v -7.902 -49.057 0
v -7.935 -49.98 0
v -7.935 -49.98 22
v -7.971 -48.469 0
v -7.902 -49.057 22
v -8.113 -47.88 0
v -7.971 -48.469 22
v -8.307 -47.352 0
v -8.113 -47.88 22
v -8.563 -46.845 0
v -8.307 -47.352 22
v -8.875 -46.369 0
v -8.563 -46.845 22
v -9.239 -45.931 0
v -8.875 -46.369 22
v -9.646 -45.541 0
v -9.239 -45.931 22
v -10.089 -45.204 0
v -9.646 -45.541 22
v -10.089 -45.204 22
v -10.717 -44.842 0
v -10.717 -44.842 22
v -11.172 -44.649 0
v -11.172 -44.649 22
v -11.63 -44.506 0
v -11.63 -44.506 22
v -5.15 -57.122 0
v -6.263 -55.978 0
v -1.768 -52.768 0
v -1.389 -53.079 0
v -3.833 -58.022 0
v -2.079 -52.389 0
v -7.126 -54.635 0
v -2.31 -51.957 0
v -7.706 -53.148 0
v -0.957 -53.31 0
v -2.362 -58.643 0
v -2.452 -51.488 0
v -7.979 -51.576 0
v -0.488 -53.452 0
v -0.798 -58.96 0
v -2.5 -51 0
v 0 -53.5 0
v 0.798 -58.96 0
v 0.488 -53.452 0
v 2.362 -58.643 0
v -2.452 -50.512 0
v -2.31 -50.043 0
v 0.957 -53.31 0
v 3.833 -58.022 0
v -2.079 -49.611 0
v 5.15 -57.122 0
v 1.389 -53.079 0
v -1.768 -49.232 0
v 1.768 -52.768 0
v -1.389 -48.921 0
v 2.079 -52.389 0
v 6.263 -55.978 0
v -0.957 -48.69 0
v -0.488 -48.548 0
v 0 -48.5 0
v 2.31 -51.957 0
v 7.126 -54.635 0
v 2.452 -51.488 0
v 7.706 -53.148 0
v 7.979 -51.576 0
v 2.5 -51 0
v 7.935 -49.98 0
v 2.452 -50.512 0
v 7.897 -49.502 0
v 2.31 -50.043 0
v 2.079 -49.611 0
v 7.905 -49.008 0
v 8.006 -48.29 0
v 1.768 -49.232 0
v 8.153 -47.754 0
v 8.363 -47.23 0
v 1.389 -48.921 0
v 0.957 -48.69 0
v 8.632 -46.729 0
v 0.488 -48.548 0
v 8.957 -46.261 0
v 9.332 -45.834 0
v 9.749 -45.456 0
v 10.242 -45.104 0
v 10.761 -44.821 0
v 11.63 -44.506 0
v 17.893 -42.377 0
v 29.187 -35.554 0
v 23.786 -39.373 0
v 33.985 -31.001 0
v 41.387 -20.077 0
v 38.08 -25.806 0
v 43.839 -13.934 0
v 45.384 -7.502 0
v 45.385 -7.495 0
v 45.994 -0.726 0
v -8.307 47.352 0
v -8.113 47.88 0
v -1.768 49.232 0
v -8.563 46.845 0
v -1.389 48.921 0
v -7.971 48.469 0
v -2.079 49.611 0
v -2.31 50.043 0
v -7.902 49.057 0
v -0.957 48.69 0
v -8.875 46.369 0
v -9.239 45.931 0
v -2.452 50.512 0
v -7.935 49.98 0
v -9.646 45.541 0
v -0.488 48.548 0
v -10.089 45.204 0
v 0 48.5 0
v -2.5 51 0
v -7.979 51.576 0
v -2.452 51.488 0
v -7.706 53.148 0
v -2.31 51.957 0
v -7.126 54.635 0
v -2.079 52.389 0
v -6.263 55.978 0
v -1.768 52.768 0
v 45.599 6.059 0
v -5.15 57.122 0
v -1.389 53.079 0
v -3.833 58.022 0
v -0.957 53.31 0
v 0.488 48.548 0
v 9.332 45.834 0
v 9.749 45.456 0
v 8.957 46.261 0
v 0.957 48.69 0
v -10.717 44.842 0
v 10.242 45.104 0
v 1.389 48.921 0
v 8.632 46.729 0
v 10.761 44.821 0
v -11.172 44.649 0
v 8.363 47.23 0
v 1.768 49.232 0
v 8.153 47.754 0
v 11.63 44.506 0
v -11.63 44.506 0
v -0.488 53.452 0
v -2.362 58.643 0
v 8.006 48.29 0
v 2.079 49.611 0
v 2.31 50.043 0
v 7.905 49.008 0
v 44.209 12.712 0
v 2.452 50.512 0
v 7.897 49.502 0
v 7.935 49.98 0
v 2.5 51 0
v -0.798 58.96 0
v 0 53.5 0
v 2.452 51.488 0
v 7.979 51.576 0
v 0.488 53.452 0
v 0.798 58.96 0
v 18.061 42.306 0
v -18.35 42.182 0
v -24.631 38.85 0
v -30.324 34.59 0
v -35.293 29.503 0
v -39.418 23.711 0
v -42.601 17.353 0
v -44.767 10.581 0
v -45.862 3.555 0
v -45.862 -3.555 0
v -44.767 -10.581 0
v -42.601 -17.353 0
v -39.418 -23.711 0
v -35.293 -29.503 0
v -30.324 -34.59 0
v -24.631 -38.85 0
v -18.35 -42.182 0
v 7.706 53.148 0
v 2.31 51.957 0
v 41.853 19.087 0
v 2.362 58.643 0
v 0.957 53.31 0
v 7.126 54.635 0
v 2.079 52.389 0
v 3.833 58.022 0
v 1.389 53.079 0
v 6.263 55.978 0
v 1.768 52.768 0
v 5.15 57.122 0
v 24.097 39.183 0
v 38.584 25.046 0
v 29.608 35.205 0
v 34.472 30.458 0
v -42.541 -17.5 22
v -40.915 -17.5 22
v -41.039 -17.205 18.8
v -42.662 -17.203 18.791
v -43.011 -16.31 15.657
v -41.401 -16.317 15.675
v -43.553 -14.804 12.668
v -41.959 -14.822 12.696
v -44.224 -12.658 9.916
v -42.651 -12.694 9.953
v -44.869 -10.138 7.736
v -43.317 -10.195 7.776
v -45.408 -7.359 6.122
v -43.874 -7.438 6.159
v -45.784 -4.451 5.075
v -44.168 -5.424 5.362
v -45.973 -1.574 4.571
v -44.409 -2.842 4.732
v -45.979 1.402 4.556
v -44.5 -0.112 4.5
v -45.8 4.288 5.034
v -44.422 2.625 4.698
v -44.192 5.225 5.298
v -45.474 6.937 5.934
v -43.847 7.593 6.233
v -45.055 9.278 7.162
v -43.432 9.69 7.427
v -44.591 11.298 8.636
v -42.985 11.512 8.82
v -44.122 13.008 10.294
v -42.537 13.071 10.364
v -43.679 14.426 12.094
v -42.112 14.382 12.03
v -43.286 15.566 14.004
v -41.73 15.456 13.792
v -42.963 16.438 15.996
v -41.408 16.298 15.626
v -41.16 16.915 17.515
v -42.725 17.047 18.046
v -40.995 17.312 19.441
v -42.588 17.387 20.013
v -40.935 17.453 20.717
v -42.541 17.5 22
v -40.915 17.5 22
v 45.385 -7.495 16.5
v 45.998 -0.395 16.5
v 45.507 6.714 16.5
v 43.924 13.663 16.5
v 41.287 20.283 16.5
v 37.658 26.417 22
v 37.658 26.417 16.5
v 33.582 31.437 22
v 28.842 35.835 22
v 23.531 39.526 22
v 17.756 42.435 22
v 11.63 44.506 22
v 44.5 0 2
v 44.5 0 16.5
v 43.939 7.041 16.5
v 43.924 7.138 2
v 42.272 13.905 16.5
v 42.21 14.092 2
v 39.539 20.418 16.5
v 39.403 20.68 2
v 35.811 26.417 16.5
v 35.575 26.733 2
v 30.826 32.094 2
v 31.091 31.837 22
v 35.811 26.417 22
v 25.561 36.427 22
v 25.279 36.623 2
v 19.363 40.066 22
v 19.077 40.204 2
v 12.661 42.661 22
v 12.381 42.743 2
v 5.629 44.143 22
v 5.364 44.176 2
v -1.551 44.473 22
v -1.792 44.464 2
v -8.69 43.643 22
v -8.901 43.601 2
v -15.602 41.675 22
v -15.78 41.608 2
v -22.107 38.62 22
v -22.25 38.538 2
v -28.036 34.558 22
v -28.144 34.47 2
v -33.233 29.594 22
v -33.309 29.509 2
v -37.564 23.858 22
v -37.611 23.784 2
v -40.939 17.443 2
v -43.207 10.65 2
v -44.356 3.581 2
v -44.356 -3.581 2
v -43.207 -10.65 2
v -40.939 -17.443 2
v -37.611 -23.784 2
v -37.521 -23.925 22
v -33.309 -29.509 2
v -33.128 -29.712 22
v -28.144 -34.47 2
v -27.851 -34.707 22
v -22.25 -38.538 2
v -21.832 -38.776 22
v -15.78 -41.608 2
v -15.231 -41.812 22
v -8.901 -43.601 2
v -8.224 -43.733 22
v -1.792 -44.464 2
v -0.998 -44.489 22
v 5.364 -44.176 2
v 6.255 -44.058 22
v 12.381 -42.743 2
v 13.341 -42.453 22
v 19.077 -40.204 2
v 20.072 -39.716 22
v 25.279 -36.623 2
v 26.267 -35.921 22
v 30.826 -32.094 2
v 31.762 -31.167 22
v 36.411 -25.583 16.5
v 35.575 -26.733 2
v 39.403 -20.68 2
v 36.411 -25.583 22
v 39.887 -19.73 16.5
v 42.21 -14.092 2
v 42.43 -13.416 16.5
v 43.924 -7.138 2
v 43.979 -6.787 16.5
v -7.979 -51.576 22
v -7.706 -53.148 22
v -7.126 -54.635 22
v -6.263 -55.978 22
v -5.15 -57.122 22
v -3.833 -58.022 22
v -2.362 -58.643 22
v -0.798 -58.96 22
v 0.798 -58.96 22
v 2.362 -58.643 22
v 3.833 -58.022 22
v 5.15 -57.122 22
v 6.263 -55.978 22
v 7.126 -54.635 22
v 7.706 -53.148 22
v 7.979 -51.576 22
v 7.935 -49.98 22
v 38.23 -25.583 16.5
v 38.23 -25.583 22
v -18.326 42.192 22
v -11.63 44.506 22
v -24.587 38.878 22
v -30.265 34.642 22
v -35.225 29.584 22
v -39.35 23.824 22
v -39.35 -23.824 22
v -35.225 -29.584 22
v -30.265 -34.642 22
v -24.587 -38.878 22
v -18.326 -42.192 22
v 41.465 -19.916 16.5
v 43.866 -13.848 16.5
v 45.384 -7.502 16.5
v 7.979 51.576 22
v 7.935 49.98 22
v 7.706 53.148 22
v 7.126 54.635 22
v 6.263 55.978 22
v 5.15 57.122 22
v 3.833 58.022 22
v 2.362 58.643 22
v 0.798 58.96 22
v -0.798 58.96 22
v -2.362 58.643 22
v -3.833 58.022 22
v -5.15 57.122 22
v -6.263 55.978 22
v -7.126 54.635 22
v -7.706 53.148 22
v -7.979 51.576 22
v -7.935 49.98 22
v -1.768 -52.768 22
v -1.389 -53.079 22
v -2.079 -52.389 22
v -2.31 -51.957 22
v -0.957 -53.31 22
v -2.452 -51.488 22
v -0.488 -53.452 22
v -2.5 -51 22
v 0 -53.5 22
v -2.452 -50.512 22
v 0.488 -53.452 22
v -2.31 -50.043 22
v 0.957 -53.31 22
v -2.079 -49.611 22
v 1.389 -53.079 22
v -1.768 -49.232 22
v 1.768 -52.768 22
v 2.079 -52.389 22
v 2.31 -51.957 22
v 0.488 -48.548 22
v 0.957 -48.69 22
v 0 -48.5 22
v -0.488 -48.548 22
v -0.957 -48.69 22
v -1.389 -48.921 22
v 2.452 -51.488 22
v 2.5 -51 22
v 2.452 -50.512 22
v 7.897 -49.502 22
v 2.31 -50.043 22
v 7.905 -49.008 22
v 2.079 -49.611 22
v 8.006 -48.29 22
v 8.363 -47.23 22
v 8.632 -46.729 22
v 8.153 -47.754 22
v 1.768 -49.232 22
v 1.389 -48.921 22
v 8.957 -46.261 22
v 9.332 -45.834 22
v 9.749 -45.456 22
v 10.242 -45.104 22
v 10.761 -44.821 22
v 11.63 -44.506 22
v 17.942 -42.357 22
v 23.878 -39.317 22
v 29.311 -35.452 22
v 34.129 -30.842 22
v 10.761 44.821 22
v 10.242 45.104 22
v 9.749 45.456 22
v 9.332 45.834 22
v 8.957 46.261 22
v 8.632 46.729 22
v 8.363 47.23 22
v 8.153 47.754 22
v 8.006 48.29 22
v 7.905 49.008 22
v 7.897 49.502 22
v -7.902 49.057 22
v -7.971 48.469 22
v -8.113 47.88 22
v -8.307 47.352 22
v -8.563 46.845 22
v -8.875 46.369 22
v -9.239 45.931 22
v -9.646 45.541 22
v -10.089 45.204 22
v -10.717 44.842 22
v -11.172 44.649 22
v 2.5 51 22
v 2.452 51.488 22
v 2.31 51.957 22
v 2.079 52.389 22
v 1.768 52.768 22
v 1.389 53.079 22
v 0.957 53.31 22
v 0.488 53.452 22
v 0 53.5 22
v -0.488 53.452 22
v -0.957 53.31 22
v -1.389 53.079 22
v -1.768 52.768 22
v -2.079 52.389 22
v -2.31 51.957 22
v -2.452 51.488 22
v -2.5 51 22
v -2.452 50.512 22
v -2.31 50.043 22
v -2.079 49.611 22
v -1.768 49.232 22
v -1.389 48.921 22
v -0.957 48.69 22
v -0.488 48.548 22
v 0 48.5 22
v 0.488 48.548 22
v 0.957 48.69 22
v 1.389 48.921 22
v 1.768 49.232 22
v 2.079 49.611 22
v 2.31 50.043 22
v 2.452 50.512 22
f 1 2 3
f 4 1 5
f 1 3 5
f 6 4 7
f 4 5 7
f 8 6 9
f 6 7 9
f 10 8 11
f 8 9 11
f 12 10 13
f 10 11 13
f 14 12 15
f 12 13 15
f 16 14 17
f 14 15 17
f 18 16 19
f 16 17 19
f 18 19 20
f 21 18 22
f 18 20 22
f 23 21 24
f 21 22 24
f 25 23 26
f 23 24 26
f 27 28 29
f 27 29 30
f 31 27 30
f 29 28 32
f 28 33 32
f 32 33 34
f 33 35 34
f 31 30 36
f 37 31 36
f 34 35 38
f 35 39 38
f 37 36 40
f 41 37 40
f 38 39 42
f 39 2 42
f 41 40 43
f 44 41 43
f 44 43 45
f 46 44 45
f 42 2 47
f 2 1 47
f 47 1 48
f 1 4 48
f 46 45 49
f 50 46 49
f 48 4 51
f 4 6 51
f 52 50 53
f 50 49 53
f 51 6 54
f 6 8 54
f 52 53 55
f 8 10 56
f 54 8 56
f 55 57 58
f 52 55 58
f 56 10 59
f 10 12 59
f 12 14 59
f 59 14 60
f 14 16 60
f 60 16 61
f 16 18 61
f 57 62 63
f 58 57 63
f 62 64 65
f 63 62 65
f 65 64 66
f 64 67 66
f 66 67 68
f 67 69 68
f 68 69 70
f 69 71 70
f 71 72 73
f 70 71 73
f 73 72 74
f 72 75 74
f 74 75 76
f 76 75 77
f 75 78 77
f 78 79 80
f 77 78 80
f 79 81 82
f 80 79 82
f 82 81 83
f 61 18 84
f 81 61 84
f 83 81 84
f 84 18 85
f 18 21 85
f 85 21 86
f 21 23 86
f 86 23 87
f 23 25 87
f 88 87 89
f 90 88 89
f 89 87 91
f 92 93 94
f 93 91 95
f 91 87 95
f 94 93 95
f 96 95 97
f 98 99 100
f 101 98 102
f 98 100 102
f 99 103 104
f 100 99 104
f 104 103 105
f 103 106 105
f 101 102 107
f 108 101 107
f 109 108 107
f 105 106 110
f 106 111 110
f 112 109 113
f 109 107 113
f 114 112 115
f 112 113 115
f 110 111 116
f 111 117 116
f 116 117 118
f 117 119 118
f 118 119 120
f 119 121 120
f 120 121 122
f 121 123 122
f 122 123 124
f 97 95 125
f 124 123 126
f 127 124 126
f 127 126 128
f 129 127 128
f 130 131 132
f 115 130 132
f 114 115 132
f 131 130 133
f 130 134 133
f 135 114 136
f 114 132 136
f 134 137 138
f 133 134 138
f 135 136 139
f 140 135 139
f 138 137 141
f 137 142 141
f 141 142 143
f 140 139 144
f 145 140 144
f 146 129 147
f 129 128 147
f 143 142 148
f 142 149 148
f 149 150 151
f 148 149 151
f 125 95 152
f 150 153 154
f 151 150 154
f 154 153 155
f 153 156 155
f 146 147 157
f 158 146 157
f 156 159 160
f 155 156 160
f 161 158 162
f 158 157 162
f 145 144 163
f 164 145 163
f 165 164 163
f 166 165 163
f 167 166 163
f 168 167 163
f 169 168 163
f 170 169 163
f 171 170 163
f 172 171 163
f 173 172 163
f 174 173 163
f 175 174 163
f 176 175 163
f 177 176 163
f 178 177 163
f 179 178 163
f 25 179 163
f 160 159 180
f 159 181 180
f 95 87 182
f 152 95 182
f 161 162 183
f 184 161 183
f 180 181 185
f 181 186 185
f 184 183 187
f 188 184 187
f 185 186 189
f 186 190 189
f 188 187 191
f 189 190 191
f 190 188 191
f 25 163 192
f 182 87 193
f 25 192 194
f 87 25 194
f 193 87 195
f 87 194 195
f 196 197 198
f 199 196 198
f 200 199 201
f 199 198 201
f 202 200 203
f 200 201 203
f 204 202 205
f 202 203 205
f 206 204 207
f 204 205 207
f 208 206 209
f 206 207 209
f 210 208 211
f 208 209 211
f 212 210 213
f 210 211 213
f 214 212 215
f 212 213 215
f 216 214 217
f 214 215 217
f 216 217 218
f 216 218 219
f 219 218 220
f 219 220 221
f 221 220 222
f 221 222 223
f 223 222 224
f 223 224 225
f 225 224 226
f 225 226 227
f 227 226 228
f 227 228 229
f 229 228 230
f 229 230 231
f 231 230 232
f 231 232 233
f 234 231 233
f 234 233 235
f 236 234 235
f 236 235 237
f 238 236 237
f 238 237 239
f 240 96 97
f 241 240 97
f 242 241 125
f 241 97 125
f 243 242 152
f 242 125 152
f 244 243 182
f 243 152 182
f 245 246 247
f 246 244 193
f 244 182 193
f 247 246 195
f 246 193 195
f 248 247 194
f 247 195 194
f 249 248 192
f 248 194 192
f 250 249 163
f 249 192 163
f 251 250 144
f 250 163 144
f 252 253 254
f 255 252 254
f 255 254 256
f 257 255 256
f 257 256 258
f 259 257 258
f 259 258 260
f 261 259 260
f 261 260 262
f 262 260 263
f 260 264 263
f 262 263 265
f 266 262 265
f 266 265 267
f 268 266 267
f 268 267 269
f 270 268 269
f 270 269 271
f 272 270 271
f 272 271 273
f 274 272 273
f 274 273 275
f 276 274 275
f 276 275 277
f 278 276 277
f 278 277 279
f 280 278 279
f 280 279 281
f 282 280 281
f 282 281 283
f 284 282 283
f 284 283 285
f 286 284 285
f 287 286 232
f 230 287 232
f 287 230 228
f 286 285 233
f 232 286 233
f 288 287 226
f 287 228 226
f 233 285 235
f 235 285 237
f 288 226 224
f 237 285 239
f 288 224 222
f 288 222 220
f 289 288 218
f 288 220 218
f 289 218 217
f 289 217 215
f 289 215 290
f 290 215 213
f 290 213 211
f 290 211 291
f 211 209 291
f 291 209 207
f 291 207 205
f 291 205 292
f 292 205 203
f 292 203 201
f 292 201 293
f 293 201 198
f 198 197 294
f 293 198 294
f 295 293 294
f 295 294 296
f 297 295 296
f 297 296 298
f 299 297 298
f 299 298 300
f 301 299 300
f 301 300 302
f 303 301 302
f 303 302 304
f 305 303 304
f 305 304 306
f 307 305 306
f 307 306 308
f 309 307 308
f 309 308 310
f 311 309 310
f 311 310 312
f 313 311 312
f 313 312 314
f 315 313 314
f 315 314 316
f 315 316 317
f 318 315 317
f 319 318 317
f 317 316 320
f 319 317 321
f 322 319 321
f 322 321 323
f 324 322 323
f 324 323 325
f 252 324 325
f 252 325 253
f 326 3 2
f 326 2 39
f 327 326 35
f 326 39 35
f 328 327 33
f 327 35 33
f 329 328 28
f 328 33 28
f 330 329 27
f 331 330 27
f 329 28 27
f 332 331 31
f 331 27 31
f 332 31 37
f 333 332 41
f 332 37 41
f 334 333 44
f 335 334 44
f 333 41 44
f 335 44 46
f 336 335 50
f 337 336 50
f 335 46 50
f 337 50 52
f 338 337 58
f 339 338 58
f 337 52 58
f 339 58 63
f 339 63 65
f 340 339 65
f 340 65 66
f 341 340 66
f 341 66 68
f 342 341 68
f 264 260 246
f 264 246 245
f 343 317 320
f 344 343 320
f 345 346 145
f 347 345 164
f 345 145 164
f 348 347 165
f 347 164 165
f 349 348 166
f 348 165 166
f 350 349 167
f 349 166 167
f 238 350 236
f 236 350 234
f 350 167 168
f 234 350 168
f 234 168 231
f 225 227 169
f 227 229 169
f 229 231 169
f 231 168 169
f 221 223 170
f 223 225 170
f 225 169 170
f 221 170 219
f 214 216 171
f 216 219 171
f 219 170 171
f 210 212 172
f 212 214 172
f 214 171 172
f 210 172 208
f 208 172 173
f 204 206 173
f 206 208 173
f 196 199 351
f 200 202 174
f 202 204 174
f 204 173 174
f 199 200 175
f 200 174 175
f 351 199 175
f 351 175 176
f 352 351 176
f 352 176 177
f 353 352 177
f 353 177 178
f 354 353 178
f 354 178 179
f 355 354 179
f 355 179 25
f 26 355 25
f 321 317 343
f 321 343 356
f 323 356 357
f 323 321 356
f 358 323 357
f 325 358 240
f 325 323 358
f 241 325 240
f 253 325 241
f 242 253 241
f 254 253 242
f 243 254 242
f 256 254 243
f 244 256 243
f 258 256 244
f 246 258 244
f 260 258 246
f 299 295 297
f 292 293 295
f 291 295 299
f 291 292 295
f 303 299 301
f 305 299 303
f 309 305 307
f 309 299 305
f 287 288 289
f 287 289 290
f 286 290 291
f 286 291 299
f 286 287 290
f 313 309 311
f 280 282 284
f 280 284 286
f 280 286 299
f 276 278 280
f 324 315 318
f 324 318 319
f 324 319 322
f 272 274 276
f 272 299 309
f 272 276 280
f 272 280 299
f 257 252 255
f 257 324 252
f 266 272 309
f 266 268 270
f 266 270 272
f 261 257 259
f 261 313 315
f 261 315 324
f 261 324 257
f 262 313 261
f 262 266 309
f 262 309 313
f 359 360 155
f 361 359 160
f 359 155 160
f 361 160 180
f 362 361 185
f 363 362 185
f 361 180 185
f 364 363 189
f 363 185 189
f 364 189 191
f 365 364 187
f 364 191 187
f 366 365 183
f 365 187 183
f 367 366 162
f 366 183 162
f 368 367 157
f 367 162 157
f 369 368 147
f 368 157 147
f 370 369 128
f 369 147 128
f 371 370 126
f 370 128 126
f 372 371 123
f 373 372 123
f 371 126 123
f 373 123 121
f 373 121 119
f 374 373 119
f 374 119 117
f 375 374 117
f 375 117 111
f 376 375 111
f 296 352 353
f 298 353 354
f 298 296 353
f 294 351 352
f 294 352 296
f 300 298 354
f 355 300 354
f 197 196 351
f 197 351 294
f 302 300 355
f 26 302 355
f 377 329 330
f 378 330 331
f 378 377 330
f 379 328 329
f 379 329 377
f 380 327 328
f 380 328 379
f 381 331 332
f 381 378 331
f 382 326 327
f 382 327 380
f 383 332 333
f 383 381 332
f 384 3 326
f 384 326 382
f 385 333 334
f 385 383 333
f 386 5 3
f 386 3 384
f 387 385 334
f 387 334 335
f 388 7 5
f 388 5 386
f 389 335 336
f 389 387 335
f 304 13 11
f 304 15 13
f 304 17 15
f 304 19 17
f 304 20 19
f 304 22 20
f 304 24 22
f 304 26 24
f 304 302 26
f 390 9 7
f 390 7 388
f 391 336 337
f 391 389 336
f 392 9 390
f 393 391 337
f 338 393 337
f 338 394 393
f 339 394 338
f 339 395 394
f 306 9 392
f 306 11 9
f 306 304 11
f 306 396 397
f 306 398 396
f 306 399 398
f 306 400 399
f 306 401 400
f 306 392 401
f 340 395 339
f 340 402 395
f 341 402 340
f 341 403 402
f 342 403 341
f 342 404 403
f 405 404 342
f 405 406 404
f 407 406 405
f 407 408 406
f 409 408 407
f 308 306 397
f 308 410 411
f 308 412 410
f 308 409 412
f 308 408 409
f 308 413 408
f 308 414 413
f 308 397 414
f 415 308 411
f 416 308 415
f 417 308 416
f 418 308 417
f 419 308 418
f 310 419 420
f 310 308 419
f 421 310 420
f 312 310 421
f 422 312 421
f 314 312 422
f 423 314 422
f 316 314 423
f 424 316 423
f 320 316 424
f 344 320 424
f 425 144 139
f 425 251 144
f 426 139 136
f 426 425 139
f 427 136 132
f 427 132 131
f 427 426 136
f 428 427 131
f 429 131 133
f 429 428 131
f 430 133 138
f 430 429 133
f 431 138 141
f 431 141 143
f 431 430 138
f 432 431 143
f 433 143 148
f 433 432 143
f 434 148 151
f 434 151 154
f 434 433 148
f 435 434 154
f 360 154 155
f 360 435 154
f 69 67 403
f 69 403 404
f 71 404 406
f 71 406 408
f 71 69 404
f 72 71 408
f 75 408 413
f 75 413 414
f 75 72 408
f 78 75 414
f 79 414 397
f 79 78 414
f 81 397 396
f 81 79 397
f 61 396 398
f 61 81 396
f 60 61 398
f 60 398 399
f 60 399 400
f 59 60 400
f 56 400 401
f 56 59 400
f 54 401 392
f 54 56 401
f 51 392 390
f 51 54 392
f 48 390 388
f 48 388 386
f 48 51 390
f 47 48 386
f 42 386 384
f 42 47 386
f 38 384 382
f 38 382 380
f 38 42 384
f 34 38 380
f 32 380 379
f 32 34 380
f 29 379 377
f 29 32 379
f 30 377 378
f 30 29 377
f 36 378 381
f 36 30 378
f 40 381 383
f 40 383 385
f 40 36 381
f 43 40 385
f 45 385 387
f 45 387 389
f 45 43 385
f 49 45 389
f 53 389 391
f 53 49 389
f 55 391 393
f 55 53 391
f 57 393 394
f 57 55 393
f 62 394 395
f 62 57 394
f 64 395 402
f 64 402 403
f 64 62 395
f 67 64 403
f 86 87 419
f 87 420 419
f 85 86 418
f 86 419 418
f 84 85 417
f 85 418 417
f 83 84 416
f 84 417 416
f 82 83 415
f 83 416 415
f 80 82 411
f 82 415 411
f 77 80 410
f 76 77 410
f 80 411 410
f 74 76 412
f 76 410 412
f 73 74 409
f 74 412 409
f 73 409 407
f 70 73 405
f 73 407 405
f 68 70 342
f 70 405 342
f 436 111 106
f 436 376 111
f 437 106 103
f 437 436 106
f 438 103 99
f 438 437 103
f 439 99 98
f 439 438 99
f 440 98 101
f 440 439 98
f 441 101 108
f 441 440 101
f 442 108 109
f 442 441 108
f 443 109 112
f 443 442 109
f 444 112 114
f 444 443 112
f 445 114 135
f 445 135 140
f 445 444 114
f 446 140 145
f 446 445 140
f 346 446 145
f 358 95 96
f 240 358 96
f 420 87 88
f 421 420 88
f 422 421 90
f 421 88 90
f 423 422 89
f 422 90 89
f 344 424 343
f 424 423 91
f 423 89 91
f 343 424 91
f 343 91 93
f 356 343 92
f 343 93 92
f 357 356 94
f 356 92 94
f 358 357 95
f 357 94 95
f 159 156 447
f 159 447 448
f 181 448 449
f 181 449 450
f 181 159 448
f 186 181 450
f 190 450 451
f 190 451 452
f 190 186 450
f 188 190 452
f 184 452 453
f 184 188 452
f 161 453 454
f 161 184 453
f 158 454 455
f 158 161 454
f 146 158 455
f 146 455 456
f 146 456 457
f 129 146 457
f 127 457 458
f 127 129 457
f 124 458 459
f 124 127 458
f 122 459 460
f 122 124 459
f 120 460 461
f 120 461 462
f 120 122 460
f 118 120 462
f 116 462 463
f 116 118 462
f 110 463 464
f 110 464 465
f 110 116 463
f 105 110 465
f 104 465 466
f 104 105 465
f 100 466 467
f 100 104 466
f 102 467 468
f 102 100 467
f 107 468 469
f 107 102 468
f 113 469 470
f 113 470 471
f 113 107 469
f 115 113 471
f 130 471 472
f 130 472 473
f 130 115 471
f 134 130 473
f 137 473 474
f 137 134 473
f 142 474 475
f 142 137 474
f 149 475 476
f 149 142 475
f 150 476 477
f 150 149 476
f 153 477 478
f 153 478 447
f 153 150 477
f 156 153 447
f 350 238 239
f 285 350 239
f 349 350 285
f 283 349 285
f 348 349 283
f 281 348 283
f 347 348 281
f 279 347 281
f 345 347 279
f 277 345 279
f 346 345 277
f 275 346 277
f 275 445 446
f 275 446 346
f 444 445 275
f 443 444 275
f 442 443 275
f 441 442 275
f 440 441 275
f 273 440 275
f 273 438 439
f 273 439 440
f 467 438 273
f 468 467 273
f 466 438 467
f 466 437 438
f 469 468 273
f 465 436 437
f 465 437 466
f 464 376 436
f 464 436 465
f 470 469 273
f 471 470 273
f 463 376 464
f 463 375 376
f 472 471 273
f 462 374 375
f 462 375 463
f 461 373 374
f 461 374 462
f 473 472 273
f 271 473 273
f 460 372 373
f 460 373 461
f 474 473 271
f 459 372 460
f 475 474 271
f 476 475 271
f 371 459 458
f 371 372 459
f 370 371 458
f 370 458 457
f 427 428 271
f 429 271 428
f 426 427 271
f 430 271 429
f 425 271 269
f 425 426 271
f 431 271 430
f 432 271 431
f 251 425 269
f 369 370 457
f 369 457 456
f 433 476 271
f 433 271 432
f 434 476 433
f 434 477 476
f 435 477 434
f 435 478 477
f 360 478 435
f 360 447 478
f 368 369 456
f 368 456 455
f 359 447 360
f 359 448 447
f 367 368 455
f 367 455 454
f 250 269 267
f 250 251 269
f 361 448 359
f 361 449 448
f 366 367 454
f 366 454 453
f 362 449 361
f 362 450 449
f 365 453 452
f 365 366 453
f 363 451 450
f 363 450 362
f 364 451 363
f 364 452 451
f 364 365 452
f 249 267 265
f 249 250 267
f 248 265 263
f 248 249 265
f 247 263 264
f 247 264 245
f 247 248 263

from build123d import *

# Parameters (mm, degrees)
F0_R     = 2.5
F1_DEPTH = 22
F3_W     = 52
F3_H     = 5.5
F4_DEPTH = 115.138352
F5_R     = 44.5
F6_DEPTH = 20
F2_R     = 17.5
F7_DEPTH = 60.93917
F8_R     = 5


with BuildPart() as f1:
    # F0 (on Top) → F1 (new body)
    with BuildSketch(Plane.XY):
        with BuildLine():
            Line((45.384134, -7.502026), (45.385261, -7.495206))
            ThreePointArc((45.385261, -7.495206), (36.922436, 27.435993), (5.918638, 45.617647))
            ThreePointArc((5.918638, 45.617647), (0, 59), (-5.918638, 45.617647))
            ThreePointArc((-5.918638, 45.617647), (-46, 0), (-5.918638, -45.617647))
            ThreePointArc((-5.918638, -45.617647), (0, -59), (5.918638, -45.617647))
            ThreePointArc((5.918638, -45.617647), (31.956122, -33.087857), (45.384134, -7.502026))
        make_face()
        with Locations((0, -51)):
            Circle(F0_R, mode=Mode.SUBTRACT)
        with Locations((0, 51)):
            Circle(F0_R, mode=Mode.SUBTRACT)
    extrude(amount=F1_DEPTH)

    # F3 (on Right) → F4 (cut)
    with BuildSketch(Plane.YZ):
        with Locations((0.416768, 19.25)):
            Rectangle(F3_W, F3_H)
    extrude(amount=F4_DEPTH, mode=Mode.SUBTRACT)

    # F5 (on face) → F6 (cut)
    with BuildSketch(Plane.XY.offset(22)):
        Circle(F5_R)
    extrude(amount=-F6_DEPTH, mode=Mode.SUBTRACT)

    # F2 (on Right) → F7 (cut)
    with BuildSketch(Plane.YZ):
        with Locations((0, 22)):
            Circle(F2_R)
    extrude(amount=-F7_DEPTH, mode=Mode.SUBTRACT)

    # F8
    f8_edges = [f1.edges().sort_by_distance(p)[0] for p in [
        (-5.918638, -45.617647, 11),
        (5.918638, -45.617647, 11),
        (5.918638, 45.617647, 11),
        (-5.918638, 45.617647, 11),
    ]]
    fillet(f8_edges, radius=F8_R)


solid = f1.part
